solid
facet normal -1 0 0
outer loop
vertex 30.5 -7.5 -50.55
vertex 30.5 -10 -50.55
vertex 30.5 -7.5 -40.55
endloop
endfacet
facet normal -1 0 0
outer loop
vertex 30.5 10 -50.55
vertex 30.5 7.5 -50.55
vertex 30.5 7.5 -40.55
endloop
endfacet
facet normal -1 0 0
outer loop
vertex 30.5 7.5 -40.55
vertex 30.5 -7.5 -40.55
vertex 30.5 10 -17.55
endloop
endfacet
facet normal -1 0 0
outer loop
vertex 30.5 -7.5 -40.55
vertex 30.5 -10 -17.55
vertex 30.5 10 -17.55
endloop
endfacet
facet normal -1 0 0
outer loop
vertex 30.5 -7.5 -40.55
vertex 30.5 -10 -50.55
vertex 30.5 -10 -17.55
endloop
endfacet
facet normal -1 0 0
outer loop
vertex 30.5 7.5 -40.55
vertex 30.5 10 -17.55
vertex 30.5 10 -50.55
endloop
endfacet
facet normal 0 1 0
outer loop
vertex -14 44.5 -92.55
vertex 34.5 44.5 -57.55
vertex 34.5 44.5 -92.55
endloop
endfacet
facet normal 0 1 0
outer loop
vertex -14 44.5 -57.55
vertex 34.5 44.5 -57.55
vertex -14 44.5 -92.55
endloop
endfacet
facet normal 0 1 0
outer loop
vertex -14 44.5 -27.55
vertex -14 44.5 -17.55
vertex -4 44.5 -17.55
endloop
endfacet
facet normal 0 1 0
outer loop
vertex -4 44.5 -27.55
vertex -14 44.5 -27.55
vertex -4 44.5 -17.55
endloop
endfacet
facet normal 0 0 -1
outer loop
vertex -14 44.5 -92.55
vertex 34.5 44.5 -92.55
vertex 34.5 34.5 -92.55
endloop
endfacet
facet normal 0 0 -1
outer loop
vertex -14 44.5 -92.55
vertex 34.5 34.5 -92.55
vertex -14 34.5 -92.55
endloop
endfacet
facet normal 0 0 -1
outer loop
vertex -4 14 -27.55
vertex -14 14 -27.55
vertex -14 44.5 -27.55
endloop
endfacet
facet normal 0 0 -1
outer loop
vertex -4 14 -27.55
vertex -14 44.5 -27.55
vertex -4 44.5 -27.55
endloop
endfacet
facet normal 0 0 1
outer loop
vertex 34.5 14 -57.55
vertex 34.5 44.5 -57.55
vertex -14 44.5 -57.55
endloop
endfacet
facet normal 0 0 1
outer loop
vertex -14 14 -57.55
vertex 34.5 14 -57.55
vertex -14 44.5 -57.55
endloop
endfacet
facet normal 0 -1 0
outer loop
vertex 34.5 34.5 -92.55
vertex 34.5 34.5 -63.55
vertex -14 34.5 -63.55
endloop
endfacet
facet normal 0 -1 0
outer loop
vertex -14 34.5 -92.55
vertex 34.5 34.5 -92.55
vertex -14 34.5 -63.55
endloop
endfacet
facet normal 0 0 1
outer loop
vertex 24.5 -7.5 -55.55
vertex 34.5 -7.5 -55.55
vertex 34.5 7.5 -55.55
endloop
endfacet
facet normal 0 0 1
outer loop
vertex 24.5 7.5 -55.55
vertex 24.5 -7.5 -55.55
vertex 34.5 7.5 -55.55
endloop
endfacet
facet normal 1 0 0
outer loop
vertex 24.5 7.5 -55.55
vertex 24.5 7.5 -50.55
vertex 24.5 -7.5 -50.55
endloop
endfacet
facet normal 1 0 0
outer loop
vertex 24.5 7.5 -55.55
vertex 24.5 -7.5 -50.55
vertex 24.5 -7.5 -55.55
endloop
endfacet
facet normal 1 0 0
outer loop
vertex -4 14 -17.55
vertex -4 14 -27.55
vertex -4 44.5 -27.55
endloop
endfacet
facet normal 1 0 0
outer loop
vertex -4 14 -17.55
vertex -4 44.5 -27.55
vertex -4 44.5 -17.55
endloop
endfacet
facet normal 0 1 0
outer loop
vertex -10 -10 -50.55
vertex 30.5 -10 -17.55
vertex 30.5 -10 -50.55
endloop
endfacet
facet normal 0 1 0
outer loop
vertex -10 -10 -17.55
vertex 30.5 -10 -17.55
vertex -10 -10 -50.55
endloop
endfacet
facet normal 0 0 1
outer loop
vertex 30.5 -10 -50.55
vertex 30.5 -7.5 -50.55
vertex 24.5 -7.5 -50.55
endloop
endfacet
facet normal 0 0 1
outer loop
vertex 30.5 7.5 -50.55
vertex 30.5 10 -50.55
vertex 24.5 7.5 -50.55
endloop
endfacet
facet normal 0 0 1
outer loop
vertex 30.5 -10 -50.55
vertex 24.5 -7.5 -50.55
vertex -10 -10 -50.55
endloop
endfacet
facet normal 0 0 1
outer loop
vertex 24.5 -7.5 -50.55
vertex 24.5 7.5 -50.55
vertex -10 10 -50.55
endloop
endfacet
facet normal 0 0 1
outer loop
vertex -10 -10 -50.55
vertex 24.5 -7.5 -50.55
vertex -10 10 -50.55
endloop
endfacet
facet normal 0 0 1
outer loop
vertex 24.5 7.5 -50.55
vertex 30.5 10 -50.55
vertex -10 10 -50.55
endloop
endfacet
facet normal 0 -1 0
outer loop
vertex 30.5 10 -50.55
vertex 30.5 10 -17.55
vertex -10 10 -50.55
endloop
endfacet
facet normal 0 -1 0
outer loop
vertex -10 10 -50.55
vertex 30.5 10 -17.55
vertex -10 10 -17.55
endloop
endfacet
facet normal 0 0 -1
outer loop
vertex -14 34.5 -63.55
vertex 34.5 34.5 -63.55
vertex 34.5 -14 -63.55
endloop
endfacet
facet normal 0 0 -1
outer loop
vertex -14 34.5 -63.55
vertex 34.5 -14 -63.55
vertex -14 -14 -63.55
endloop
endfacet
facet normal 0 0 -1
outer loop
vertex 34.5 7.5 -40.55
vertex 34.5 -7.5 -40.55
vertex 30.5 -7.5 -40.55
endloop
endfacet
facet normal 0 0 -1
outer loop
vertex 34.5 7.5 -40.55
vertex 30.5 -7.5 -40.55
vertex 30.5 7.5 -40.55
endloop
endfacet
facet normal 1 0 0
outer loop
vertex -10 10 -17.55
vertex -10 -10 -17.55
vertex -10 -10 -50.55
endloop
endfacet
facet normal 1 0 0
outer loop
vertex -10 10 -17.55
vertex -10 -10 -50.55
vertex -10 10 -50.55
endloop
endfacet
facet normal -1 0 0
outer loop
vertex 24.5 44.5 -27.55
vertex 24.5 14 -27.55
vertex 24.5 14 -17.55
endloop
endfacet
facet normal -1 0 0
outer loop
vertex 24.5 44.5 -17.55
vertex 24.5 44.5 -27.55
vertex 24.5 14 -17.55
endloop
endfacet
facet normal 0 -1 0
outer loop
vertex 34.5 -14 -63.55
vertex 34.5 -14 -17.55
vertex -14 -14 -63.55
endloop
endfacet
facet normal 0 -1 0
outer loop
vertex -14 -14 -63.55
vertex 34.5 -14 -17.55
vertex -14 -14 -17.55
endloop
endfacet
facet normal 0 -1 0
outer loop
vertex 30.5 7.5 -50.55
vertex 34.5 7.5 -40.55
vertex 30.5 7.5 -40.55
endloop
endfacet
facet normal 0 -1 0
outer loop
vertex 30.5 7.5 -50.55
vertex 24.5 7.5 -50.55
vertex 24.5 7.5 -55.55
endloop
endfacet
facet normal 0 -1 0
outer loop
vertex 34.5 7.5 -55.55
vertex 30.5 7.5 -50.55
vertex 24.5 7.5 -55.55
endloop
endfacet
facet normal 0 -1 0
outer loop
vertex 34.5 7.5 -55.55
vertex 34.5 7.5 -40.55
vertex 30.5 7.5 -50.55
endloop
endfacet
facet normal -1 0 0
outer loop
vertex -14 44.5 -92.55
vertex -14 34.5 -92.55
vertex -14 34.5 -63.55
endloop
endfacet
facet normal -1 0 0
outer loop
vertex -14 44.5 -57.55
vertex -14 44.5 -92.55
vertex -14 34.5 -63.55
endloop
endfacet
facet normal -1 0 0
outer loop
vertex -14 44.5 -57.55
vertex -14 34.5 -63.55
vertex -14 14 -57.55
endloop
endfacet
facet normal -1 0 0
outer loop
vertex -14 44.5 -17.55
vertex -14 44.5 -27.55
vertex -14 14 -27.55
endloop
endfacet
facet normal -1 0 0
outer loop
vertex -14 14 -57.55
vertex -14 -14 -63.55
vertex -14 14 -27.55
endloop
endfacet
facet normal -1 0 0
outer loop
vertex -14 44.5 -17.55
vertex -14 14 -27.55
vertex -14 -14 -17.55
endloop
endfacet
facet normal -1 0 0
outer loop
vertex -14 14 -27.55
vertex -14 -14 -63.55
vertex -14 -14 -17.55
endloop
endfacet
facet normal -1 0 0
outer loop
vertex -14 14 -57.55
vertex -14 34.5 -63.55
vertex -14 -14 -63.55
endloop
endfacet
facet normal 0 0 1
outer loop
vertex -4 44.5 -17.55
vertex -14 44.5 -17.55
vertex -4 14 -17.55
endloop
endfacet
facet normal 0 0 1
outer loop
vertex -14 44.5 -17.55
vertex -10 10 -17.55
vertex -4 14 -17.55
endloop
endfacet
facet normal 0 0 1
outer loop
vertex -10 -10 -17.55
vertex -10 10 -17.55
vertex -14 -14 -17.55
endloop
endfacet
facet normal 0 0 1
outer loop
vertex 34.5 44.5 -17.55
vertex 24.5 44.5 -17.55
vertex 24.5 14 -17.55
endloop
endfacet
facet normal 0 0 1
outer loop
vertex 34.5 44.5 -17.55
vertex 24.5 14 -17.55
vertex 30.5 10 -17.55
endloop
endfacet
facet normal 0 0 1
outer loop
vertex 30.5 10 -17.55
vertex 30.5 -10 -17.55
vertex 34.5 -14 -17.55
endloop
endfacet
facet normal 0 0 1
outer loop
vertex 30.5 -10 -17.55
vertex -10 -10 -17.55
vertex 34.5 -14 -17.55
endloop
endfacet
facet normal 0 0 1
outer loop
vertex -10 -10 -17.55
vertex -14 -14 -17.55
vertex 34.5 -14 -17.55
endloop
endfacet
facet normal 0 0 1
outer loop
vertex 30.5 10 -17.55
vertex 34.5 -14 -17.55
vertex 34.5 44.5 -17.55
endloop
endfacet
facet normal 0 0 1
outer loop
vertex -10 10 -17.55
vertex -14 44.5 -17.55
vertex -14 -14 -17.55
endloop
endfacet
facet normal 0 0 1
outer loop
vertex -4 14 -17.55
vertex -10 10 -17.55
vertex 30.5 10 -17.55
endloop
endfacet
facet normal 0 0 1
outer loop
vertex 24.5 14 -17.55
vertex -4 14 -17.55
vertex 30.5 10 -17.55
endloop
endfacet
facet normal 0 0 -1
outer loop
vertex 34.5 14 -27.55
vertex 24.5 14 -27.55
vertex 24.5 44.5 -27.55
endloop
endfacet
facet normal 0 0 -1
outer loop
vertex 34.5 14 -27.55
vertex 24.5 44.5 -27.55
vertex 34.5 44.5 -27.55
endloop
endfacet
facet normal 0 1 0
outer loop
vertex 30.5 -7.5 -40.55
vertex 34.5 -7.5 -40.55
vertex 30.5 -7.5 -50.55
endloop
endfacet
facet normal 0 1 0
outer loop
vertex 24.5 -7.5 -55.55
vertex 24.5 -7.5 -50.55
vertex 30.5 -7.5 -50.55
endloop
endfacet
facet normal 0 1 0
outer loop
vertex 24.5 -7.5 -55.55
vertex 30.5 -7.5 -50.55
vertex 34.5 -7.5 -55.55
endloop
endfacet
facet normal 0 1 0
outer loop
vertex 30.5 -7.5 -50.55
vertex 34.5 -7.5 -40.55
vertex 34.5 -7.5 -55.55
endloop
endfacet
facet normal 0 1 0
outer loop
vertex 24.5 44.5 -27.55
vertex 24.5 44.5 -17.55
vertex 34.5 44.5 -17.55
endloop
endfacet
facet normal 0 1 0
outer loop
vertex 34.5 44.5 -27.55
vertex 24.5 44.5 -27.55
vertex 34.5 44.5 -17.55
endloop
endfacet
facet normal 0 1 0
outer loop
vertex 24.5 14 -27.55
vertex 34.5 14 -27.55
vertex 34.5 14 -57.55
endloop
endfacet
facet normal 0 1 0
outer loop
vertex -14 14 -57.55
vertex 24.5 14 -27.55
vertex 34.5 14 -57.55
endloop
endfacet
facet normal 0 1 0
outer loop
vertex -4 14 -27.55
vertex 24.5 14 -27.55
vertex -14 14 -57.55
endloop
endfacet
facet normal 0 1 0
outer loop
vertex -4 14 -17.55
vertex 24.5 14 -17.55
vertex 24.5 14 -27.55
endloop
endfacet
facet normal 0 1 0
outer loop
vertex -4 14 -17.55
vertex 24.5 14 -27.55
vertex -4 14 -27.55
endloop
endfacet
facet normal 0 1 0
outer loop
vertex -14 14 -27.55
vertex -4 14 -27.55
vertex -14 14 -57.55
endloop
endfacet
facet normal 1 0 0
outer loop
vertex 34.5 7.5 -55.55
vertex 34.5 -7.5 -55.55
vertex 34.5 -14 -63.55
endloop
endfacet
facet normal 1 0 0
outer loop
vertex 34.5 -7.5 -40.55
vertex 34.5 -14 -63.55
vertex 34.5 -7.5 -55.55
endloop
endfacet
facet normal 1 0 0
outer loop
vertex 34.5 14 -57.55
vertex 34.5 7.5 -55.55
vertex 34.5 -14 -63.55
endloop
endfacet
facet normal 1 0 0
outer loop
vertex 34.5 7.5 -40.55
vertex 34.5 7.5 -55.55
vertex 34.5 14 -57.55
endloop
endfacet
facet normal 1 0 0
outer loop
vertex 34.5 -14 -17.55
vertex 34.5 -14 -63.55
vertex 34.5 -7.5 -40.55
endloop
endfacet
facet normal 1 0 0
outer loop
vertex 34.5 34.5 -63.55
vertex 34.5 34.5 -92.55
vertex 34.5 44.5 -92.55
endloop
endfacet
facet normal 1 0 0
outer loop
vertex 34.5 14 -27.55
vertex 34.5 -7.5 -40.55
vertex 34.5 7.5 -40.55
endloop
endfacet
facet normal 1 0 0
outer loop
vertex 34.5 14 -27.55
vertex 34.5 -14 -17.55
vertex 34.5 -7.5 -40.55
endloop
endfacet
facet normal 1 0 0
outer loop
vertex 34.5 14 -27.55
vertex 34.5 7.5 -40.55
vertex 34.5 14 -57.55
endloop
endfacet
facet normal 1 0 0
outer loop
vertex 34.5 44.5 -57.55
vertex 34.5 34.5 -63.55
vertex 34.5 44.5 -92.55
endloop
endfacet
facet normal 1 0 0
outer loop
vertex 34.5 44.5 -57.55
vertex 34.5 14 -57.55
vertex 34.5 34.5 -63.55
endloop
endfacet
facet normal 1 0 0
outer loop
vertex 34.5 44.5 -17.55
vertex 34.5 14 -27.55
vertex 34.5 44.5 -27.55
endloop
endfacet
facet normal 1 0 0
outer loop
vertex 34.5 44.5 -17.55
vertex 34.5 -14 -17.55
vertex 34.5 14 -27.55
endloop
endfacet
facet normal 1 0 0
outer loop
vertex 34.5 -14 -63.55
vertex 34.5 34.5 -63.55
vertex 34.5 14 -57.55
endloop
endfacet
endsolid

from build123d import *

# Parameters (mm, degrees)
SKETCH1_W           = 48.5
SKETCH1_H           = 28
SKETCH1_W_2         = 40.5
SKETCH1_H_2         = 20
BOSS_EXTRUDE1_DEPTH = 40
SKETCH2_W           = 48.5
SKETCH2_H           = 28
BOSS_EXTRUDE2_DEPTH = 7
SKETCH3_W           = 15
SKETCH3_H           = 15
CUT_EXTRUDE1_DEPTH  = 10
SKETCH4_W           = 48.5
SKETCH4_H           = 58.5
BOSS_EXTRUDE3_DEPTH = 6
SKETCH4_3_W         = 48.5
SKETCH4_3_H         = 10
BOSS_EXTRUDE4_DEPTH = 35
SKETCH5_W           = 10
SKETCH5_H           = 10
BOSS_EXTRUDE5_DEPTH = 30.5


with BuildPart() as part:
    # Sketch1 → Boss-Extrude1 (new body)
    with BuildSketch(Plane(origin=(0, 0, -17.55), x_dir=(-1, 0, 0), z_dir=(0, 0, -1))):
        with Locations((-10.25, 0)):
            Rectangle(SKETCH1_W, SKETCH1_H)
        with Locations((-10.25, 0)):
            Rectangle(SKETCH1_W_2, SKETCH1_H_2, mode=Mode.SUBTRACT)
    extrude(amount=BOSS_EXTRUDE1_DEPTH)

    # Sketch2 → Boss-Extrude2 (add)
    with BuildSketch(Plane(origin=(0, 0, -57.55), x_dir=(-1, 0, 0), z_dir=(0, 0, -1))):
        with Locations((-10.25, 0)):
            Rectangle(SKETCH2_W, SKETCH2_H)
    extrude(amount=-BOSS_EXTRUDE2_DEPTH)

    # Sketch3 → Cut-Extrude1 (cut)
    with BuildSketch(Plane(origin=(34.5, 0, 0), x_dir=(0, 0, -1), z_dir=(1, 0, 0))):
        with Locations((48.05, 0)):
            Rectangle(SKETCH3_W, SKETCH3_H)
    extrude(amount=-CUT_EXTRUDE1_DEPTH, mode=Mode.SUBTRACT)

    # Sketch4 → Boss-Extrude3 (add)
    with BuildSketch(Plane(origin=(0, 0, -57.55), x_dir=(-1, 0, 0), z_dir=(0, 0, -1))):
        with Locations((-10.25, 15.25)):
            Rectangle(SKETCH4_W, SKETCH4_H)
    extrude(amount=BOSS_EXTRUDE3_DEPTH)

    # Sketch4<3> → Boss-Extrude4 (add)
    with BuildSketch(Plane(origin=(0, 0, -57.55), x_dir=(-1, 0, 0), z_dir=(0, 0, -1))):
        with Locations((-10.25, 39.5)):
            Rectangle(SKETCH4_3_W, SKETCH4_3_H)
    extrude(amount=BOSS_EXTRUDE4_DEPTH)

    # Sketch5 → Boss-Extrude5 (add)
    with BuildSketch(Plane.XZ.offset(-14)):
        with Locations((-9, -22.55)):
            Rectangle(SKETCH5_W, SKETCH5_H)
        with Locations((29.5, -22.55)):
            Rectangle(SKETCH5_W, SKETCH5_H)
    extrude(amount=-BOSS_EXTRUDE5_DEPTH)


solid = part.part
